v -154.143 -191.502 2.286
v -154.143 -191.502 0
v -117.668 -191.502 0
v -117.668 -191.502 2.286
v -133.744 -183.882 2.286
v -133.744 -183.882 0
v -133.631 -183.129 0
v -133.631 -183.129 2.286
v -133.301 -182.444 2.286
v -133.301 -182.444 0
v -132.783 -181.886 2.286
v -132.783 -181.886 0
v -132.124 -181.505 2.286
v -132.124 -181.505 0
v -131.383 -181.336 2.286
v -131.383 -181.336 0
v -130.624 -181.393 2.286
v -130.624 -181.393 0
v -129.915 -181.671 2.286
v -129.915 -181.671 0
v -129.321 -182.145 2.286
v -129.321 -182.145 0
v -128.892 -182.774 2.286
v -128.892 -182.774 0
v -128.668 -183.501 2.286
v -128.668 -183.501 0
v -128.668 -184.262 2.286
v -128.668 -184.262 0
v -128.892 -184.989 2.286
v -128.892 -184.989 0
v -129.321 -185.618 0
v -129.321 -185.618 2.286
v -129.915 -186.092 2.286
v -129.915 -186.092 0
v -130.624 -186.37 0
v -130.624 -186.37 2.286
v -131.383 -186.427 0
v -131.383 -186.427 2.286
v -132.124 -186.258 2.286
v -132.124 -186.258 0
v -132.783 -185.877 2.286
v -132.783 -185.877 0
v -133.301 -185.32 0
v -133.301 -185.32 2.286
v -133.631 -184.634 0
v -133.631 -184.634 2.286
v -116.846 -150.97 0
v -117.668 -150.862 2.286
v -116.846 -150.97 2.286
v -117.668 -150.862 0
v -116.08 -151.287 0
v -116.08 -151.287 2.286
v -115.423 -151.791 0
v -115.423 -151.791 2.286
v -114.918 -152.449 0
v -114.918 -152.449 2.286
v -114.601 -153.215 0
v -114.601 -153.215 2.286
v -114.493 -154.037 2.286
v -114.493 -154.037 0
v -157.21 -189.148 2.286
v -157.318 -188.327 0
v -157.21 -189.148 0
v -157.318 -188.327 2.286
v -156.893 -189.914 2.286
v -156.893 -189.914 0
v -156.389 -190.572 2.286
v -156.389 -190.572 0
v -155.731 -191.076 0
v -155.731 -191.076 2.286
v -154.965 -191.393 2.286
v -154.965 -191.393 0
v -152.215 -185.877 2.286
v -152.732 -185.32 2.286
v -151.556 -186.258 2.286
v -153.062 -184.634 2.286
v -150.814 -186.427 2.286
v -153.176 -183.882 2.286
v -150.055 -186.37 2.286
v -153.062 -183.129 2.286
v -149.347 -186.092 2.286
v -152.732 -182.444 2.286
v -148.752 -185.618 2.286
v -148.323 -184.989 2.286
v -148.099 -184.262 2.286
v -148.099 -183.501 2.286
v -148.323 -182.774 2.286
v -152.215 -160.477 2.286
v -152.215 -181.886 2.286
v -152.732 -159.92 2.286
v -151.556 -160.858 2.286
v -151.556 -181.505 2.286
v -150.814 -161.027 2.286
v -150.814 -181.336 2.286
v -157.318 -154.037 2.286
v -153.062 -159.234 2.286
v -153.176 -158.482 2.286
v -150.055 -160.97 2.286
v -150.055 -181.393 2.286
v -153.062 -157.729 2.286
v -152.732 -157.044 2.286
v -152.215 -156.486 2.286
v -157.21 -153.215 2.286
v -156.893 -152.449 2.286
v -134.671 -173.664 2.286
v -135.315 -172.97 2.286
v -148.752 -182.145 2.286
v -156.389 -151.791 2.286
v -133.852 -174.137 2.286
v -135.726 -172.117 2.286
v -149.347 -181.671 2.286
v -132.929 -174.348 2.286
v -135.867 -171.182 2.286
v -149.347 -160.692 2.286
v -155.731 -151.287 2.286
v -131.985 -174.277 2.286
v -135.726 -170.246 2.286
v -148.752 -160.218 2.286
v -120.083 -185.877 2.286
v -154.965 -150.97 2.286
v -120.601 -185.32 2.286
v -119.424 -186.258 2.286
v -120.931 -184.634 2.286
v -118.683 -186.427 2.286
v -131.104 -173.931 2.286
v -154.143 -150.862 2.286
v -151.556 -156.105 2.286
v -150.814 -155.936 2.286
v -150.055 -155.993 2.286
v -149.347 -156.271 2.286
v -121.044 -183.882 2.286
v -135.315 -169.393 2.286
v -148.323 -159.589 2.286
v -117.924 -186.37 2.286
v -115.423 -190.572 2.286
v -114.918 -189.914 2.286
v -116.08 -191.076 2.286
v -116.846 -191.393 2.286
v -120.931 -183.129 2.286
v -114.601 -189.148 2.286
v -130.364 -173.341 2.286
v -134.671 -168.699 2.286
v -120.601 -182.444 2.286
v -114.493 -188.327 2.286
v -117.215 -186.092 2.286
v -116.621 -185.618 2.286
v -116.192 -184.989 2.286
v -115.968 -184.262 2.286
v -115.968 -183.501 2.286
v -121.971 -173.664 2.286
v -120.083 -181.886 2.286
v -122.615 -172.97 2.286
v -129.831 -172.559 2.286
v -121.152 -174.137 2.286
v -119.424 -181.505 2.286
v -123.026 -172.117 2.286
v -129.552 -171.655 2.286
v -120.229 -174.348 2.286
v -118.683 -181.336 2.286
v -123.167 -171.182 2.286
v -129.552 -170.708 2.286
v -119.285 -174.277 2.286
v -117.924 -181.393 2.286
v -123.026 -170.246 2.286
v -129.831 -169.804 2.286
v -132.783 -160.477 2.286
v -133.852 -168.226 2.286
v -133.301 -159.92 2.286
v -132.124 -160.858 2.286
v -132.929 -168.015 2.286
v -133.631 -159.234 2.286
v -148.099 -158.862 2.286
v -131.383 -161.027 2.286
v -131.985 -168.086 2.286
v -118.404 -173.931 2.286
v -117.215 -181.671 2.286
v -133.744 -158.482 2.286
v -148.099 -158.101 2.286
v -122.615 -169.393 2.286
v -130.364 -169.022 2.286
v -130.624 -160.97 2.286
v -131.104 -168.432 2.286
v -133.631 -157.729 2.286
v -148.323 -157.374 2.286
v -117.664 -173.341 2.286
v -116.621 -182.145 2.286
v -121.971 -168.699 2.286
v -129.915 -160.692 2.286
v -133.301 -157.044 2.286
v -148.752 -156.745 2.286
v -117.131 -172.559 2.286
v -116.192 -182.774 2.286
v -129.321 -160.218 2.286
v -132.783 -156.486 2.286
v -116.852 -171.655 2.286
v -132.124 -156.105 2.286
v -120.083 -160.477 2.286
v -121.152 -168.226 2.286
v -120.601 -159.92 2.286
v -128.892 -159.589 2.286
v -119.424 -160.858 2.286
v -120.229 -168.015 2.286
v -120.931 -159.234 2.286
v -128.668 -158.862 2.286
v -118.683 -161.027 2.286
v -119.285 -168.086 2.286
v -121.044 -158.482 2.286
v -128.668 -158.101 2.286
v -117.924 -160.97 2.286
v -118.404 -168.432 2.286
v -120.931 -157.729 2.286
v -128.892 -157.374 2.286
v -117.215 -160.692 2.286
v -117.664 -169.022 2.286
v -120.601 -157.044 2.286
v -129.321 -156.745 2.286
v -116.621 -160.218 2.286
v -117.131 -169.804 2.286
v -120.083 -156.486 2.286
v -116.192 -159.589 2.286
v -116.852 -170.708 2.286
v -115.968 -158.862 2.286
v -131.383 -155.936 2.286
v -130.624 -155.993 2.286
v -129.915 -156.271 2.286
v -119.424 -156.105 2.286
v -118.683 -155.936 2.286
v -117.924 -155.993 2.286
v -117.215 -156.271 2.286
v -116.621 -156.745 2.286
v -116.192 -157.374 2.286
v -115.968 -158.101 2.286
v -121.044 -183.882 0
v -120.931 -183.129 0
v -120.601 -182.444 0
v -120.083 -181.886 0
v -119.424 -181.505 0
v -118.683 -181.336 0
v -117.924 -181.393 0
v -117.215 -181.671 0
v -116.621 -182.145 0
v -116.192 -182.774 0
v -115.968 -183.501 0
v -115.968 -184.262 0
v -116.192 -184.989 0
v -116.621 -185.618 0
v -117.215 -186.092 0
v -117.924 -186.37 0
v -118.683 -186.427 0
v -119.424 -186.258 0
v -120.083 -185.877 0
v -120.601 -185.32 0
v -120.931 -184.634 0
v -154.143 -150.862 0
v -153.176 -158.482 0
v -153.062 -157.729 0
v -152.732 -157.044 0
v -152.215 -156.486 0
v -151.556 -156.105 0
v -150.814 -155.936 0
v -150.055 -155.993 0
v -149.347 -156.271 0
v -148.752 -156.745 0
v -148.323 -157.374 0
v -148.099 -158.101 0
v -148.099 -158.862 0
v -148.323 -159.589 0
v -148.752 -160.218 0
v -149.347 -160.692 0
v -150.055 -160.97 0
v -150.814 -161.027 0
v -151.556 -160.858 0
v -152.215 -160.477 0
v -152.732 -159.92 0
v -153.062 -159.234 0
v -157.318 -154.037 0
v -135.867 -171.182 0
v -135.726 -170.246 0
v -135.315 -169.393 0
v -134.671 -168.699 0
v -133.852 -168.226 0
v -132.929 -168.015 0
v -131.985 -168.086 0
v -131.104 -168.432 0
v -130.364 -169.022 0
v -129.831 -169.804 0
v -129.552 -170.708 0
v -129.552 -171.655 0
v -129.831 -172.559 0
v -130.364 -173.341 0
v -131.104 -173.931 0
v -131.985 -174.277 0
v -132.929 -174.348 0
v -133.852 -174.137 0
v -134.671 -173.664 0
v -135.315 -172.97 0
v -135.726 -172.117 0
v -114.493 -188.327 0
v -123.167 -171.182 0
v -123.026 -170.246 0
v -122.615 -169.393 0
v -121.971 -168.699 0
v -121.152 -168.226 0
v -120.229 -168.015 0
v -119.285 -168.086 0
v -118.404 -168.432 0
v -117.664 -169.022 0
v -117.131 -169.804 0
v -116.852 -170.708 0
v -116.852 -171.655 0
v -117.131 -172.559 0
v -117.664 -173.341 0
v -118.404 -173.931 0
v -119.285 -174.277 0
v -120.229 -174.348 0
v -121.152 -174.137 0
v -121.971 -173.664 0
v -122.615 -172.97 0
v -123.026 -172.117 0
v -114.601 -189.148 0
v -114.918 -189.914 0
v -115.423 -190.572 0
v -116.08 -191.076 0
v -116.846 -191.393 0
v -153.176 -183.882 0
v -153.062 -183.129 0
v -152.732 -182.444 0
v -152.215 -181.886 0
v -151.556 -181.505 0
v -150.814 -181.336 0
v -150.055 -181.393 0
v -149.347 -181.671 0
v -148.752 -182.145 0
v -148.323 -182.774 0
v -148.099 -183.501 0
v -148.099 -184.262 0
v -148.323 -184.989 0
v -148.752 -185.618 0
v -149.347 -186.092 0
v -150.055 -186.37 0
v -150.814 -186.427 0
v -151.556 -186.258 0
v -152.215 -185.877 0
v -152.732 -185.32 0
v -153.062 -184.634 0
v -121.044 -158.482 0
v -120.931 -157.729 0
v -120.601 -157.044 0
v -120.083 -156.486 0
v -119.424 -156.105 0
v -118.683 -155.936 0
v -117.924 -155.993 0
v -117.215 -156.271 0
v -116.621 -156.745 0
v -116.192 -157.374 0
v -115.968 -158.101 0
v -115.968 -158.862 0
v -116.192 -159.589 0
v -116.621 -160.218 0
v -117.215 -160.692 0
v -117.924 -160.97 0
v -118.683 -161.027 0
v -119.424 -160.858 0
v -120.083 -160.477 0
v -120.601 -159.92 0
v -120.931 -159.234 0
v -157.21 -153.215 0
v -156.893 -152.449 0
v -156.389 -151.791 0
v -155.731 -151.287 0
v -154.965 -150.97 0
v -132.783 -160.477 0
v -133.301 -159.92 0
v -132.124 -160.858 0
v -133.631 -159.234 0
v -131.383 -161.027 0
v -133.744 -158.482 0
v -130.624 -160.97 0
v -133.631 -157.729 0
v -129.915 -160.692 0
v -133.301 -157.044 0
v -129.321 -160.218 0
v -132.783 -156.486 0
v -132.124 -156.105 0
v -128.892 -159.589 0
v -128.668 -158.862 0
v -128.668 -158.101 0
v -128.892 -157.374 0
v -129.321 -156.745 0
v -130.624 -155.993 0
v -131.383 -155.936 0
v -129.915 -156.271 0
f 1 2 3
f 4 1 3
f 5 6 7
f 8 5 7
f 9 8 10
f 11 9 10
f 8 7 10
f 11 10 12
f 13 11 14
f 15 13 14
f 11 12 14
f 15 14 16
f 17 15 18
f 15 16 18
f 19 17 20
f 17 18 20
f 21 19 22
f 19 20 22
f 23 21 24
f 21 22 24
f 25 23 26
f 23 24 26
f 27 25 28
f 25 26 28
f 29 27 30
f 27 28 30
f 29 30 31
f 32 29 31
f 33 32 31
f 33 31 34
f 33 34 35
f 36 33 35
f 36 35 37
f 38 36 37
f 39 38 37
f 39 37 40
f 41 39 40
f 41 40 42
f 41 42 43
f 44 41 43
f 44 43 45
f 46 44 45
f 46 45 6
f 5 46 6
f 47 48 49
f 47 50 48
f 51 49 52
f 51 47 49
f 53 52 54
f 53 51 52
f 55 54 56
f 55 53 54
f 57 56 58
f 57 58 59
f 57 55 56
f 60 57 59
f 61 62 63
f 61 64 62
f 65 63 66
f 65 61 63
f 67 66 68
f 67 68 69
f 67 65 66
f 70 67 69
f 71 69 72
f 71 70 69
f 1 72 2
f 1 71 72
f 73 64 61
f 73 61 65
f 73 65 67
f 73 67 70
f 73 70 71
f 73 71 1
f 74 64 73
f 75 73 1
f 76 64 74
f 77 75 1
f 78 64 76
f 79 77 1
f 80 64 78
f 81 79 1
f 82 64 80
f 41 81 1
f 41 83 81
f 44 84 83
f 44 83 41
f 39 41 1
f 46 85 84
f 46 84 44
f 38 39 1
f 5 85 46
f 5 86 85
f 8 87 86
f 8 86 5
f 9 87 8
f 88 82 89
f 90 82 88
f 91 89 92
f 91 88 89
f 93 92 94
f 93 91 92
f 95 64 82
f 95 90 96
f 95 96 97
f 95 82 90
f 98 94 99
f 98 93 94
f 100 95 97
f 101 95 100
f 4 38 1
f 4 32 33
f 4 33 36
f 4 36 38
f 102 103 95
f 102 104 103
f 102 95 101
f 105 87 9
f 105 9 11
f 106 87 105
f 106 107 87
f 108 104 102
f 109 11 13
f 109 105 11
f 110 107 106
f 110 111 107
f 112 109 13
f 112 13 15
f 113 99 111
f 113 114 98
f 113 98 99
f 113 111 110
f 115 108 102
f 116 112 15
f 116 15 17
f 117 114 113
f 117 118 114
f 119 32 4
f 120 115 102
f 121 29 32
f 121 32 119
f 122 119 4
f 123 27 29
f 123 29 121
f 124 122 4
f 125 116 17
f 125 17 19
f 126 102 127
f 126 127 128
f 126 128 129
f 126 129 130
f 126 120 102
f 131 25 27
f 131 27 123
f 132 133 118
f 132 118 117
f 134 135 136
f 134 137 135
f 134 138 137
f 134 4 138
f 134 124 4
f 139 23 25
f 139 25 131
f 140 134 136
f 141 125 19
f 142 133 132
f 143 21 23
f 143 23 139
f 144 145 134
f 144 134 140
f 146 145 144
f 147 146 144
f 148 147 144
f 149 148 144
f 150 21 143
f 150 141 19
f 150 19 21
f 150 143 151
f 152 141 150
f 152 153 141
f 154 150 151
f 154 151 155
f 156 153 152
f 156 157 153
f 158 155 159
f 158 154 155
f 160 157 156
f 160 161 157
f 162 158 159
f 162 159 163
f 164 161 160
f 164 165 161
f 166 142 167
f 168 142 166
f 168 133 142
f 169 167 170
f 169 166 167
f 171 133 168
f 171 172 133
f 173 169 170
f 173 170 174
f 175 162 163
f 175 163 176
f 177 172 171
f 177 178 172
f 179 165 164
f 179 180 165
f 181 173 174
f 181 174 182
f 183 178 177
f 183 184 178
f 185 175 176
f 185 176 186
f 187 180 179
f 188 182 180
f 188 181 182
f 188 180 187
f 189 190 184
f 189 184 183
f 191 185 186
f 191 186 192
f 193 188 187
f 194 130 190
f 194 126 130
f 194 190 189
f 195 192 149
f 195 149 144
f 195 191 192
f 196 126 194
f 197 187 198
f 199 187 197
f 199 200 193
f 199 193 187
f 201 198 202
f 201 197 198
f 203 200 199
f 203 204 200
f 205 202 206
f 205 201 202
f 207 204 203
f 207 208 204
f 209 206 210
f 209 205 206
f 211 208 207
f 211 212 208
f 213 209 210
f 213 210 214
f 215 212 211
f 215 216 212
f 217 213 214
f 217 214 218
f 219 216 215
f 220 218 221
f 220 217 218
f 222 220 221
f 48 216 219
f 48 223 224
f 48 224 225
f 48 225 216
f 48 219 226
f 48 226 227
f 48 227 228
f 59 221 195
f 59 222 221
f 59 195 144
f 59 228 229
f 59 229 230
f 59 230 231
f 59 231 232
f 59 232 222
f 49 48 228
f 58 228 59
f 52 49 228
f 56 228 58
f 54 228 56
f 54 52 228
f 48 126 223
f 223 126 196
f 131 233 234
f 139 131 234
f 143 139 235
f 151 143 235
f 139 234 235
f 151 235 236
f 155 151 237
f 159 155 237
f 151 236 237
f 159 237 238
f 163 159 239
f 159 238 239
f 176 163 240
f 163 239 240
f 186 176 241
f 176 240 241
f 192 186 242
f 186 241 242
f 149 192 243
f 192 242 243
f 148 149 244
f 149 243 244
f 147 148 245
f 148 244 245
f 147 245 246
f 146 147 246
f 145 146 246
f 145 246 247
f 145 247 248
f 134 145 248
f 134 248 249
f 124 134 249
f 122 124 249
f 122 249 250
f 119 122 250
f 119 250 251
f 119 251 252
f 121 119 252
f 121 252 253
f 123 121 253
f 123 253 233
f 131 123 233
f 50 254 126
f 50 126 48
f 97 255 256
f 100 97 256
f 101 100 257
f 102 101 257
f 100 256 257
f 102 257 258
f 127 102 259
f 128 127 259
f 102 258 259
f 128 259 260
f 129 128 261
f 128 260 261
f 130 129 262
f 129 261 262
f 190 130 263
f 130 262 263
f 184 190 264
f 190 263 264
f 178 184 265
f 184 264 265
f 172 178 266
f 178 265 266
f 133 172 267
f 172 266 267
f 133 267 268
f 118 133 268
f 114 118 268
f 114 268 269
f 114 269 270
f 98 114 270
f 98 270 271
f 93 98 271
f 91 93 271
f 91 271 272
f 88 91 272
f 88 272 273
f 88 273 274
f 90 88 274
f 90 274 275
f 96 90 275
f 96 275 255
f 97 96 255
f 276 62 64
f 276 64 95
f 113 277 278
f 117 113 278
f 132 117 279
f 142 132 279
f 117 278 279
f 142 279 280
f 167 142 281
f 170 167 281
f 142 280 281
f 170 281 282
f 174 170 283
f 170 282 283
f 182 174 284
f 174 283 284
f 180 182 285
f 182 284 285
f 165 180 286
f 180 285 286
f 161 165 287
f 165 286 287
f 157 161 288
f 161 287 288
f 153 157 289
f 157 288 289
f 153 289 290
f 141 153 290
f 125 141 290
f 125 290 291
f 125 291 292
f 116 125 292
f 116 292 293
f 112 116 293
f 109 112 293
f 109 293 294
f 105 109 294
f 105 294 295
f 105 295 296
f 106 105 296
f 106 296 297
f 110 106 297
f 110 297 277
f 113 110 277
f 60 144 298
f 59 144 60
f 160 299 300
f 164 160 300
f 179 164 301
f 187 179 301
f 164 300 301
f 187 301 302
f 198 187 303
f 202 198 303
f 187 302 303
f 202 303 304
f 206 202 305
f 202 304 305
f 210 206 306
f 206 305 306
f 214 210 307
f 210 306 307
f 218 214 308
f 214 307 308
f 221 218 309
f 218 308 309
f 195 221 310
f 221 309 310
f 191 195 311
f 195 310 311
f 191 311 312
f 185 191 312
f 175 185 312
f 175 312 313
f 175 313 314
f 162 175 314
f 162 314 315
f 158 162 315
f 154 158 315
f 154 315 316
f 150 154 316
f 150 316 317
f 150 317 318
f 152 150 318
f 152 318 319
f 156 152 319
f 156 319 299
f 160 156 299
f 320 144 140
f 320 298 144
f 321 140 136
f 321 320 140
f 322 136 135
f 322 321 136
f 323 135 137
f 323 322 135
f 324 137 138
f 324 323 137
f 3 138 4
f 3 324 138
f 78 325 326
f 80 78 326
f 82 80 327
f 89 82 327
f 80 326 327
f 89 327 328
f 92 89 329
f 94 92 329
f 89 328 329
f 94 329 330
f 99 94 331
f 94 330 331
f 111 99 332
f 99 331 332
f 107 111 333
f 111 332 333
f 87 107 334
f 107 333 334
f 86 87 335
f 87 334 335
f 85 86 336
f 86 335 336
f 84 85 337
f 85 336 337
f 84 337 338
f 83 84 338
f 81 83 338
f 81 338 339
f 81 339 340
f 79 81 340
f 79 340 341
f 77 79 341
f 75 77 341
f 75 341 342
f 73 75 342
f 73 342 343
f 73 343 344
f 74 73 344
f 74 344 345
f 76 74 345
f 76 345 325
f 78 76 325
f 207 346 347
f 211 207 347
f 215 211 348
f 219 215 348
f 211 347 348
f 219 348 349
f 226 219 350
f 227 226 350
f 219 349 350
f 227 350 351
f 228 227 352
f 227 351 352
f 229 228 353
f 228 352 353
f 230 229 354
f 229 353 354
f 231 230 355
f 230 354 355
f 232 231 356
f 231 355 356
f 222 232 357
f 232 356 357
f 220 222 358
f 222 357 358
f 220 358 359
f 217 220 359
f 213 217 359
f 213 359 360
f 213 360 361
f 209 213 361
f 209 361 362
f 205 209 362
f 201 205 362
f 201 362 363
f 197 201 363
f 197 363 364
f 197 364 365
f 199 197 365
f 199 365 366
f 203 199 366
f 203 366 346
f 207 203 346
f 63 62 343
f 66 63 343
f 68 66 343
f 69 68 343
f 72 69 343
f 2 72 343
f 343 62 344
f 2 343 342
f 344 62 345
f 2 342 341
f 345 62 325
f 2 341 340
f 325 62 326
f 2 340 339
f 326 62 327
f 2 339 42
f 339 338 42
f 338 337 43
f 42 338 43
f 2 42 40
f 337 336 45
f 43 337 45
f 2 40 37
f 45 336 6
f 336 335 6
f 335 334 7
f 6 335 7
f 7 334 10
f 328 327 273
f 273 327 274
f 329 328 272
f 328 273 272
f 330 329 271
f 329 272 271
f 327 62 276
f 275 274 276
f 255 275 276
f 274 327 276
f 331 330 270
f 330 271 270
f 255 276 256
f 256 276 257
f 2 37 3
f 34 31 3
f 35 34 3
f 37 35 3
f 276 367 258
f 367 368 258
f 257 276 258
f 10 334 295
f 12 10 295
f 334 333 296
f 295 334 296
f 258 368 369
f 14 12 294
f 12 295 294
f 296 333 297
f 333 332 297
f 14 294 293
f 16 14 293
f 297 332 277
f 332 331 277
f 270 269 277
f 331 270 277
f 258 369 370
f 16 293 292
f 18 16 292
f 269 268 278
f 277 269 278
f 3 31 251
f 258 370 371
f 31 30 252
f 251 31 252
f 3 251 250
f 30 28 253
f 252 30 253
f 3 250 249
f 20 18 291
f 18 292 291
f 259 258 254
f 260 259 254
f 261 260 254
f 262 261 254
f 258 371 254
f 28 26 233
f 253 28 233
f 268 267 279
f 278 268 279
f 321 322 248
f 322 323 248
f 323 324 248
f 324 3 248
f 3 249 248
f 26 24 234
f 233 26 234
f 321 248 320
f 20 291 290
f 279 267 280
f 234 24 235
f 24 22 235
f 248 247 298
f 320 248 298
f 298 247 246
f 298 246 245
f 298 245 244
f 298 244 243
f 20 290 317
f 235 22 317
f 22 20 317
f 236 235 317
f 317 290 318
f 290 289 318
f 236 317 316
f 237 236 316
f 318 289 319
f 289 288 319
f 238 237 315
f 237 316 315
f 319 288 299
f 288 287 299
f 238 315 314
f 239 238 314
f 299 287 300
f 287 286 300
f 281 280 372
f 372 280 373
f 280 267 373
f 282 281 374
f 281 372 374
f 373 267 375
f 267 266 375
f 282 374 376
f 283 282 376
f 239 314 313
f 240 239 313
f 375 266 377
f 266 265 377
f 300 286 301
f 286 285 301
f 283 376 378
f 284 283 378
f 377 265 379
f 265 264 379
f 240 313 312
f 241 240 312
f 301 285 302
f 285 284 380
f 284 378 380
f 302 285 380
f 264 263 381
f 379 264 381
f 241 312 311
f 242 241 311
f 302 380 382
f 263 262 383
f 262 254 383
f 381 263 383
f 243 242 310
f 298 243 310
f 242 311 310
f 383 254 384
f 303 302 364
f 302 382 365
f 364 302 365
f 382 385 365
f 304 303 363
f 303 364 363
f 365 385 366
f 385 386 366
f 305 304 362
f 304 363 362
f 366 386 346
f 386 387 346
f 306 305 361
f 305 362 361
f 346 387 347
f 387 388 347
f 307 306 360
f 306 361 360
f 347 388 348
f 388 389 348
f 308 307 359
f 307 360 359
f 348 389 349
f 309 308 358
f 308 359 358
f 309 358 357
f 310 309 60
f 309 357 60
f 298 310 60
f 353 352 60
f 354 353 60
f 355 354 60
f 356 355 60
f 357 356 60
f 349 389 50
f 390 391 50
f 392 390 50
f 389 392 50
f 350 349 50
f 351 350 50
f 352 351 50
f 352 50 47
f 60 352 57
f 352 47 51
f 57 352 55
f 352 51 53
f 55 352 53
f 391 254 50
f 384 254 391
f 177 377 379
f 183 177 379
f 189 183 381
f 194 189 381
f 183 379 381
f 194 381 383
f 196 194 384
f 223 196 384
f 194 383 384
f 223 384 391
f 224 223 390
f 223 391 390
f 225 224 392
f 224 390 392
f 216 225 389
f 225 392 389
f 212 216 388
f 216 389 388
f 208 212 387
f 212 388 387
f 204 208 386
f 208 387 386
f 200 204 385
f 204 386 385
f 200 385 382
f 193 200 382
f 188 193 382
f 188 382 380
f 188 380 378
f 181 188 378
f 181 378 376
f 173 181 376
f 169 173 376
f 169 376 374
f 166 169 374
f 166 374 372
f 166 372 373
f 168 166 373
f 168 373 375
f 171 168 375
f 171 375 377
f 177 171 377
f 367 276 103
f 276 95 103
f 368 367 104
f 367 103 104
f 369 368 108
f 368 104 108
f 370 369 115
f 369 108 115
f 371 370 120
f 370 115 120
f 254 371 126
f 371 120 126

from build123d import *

# Parameters (mm, degrees)
SKETCH1_W              = 76.2
SKETCH1_H              = 40.64
BASE_FLANGE1_DEPTH     = 2.286
CUT_EXTRUDE1_REACH     = 249.845
SKETCH6_R              = 2.5527
SKETCH6_R_2            = 3.175
FILLET1_R              = 3.175
SKETCH7_W              = 53.484881044
SKETCH7_H              = 41.537228889
REMOVE_3RD_STAGE_DEPTH = 2.54
FILLET2_R              = 3.175
SKETCH8_W              = 26.577580406
SKETCH8_H              = 64.780145769
REMOVE_2ND_STAGE_DEPTH = 248.845041068
FILLET3_R              = 3.175


# Sheet-metal steps are written as plain solids
with BuildPart() as part:
    # Sketch1 → Base-Flange1 (new body)
    with BuildSketch(Plane.XY):
        with Locations((-119.218460544, -171.181541922)):
            Rectangle(SKETCH1_W, SKETCH1_H)
    extrude(amount=BASE_FLANGE1_DEPTH)

    # Sketch6 → Cut-Extrude1 (cut, up to next)
    with BuildSketch(Plane(origin=(0, 0, 0), x_dir=(-1, 0, 0), z_dir=(0, 0, -1)), mode=Mode.PRIVATE) as cut_extrude1_sk1:
        with Locations((150.6232, -158.481541922)):
            Circle(SKETCH6_R)
    cut_extrude1_tool1 = extrude(cut_extrude1_sk1.sketch, amount=-CUT_EXTRUDE1_REACH, mode=Mode.PRIVATE) & part.part
    # Sketch6 → Cut-Extrude1 (cut, up to next)
    with BuildSketch(Plane(origin=(0, 0, 0), x_dir=(-1, 0, 0), z_dir=(0, 0, -1)), mode=Mode.PRIVATE) as cut_extrude1_sk2:
        with Locations((150.6232, -183.881541922)):
            Circle(SKETCH6_R)
    cut_extrude1_tool2 = extrude(cut_extrude1_sk2.sketch, amount=-CUT_EXTRUDE1_REACH, mode=Mode.PRIVATE) & part.part
    # Sketch6 → Cut-Extrude1 (cut, up to next)
    with BuildSketch(Plane(origin=(0, 0, 0), x_dir=(-1, 0, 0), z_dir=(0, 0, -1)), mode=Mode.PRIVATE) as cut_extrude1_sk3:
        with Locations((118.4918, -158.481541922)):
            Circle(SKETCH6_R)
    cut_extrude1_tool3 = extrude(cut_extrude1_sk3.sketch, amount=-CUT_EXTRUDE1_REACH, mode=Mode.PRIVATE) & part.part
    # Sketch6 → Cut-Extrude1 (cut, up to next)
    with BuildSketch(Plane(origin=(0, 0, 0), x_dir=(-1, 0, 0), z_dir=(0, 0, -1)), mode=Mode.PRIVATE) as cut_extrude1_sk4:
        with Locations((119.9918, -171.181541922)):
            Circle(SKETCH6_R_2)
    cut_extrude1_tool4 = extrude(cut_extrude1_sk4.sketch, amount=-CUT_EXTRUDE1_REACH, mode=Mode.PRIVATE) & part.part
    # Sketch6 → Cut-Extrude1 (cut, up to next)
    with BuildSketch(Plane(origin=(0, 0, 0), x_dir=(-1, 0, 0), z_dir=(0, 0, -1)), mode=Mode.PRIVATE) as cut_extrude1_sk5:
        with Locations((118.4918, -183.881541922)):
            Circle(SKETCH6_R)
    cut_extrude1_tool5 = extrude(cut_extrude1_sk5.sketch, amount=-CUT_EXTRUDE1_REACH, mode=Mode.PRIVATE) & part.part
    # Sketch6 → Cut-Extrude1 (cut, up to next)
    with BuildSketch(Plane(origin=(0, 0, 0), x_dir=(-1, 0, 0), z_dir=(0, 0, -1)), mode=Mode.PRIVATE) as cut_extrude1_sk6:
        with Locations((131.1918, -158.481541922)):
            Circle(SKETCH6_R)
    cut_extrude1_tool6 = extrude(cut_extrude1_sk6.sketch, amount=-CUT_EXTRUDE1_REACH, mode=Mode.PRIVATE) & part.part
    # Sketch6 → Cut-Extrude1 (cut, up to next)
    with BuildSketch(Plane(origin=(0, 0, 0), x_dir=(-1, 0, 0), z_dir=(0, 0, -1)), mode=Mode.PRIVATE) as cut_extrude1_sk7:
        with Locations((132.6918, -171.181541922)):
            Circle(SKETCH6_R_2)
    cut_extrude1_tool7 = extrude(cut_extrude1_sk7.sketch, amount=-CUT_EXTRUDE1_REACH, mode=Mode.PRIVATE) & part.part
    # Sketch6 → Cut-Extrude1 (cut, up to next)
    with BuildSketch(Plane(origin=(0, 0, 0), x_dir=(-1, 0, 0), z_dir=(0, 0, -1)), mode=Mode.PRIVATE) as cut_extrude1_sk8:
        with Locations((131.1918, -183.881541922)):
            Circle(SKETCH6_R)
    cut_extrude1_tool8 = extrude(cut_extrude1_sk8.sketch, amount=-CUT_EXTRUDE1_REACH, mode=Mode.PRIVATE) & part.part
    # Sketch6 → Cut-Extrude1 (cut, up to next)
    with BuildSketch(Plane(origin=(0, 0, 0), x_dir=(-1, 0, 0), z_dir=(0, 0, -1)), mode=Mode.PRIVATE) as cut_extrude1_sk9:
        with Locations((105.7918, -158.481541922)):
            Circle(SKETCH6_R)
    cut_extrude1_tool9 = extrude(cut_extrude1_sk9.sketch, amount=-CUT_EXTRUDE1_REACH, mode=Mode.PRIVATE) & part.part
    # Sketch6 → Cut-Extrude1 (cut, up to next)
    with BuildSketch(Plane(origin=(0, 0, 0), x_dir=(-1, 0, 0), z_dir=(0, 0, -1)), mode=Mode.PRIVATE) as cut_extrude1_sk10:
        with Locations((107.2918, -171.181541922)):
            Circle(SKETCH6_R_2)
    cut_extrude1_tool10 = extrude(cut_extrude1_sk10.sketch, amount=-CUT_EXTRUDE1_REACH, mode=Mode.PRIVATE) & part.part
    # Sketch6 → Cut-Extrude1 (cut, up to next)
    with BuildSketch(Plane(origin=(0, 0, 0), x_dir=(-1, 0, 0), z_dir=(0, 0, -1)), mode=Mode.PRIVATE) as cut_extrude1_sk11:
        with Locations((105.7918, -183.881541922)):
            Circle(SKETCH6_R)
    cut_extrude1_tool11 = extrude(cut_extrude1_sk11.sketch, amount=-CUT_EXTRUDE1_REACH, mode=Mode.PRIVATE) & part.part
    # Sketch6 → Cut-Extrude1 (cut, up to next)
    with BuildSketch(Plane(origin=(0, 0, 0), x_dir=(-1, 0, 0), z_dir=(0, 0, -1)), mode=Mode.PRIVATE) as cut_extrude1_sk12:
        with Locations((93.0918, -158.481541922)):
            Circle(SKETCH6_R)
    cut_extrude1_tool12 = extrude(cut_extrude1_sk12.sketch, amount=-CUT_EXTRUDE1_REACH, mode=Mode.PRIVATE) & part.part
    # Sketch6 → Cut-Extrude1 (cut, up to next)
    with BuildSketch(Plane(origin=(0, 0, 0), x_dir=(-1, 0, 0), z_dir=(0, 0, -1)), mode=Mode.PRIVATE) as cut_extrude1_sk13:
        with Locations((94.5918, -171.181541922)):
            Circle(SKETCH6_R_2)
    cut_extrude1_tool13 = extrude(cut_extrude1_sk13.sketch, amount=-CUT_EXTRUDE1_REACH, mode=Mode.PRIVATE) & part.part
    # Sketch6 → Cut-Extrude1 (cut, up to next)
    with BuildSketch(Plane(origin=(0, 0, 0), x_dir=(-1, 0, 0), z_dir=(0, 0, -1)), mode=Mode.PRIVATE) as cut_extrude1_sk14:
        with Locations((93.0918, -183.881541922)):
            Circle(SKETCH6_R)
    cut_extrude1_tool14 = extrude(cut_extrude1_sk14.sketch, amount=-CUT_EXTRUDE1_REACH, mode=Mode.PRIVATE) & part.part
    add(cut_extrude1_tool1.solids().sort_by_distance((-150.6232, -158.481542, 0))[0], mode=Mode.SUBTRACT)
    add(cut_extrude1_tool2.solids().sort_by_distance((-150.6232, -183.881542, 0))[0], mode=Mode.SUBTRACT)
    add(cut_extrude1_tool3.solids().sort_by_distance((-118.4918, -158.481542, 0))[0], mode=Mode.SUBTRACT)
    add(cut_extrude1_tool4.solids().sort_by_distance((-119.9918, -171.181542, 0))[0], mode=Mode.SUBTRACT)
    add(cut_extrude1_tool5.solids().sort_by_distance((-118.4918, -183.881542, 0))[0], mode=Mode.SUBTRACT)
    add(cut_extrude1_tool6.solids().sort_by_distance((-131.1918, -158.481542, 0))[0], mode=Mode.SUBTRACT)
    add(cut_extrude1_tool7.solids().sort_by_distance((-132.6918, -171.181542, 0))[0], mode=Mode.SUBTRACT)
    add(cut_extrude1_tool8.solids().sort_by_distance((-131.1918, -183.881542, 0))[0], mode=Mode.SUBTRACT)
    add(cut_extrude1_tool9.solids().sort_by_distance((-105.7918, -158.481542, 0))[0], mode=Mode.SUBTRACT)
    add(cut_extrude1_tool10.solids().sort_by_distance((-107.2918, -171.181542, 0))[0], mode=Mode.SUBTRACT)
    add(cut_extrude1_tool11.solids().sort_by_distance((-105.7918, -183.881542, 0))[0], mode=Mode.SUBTRACT)
    add(cut_extrude1_tool12.solids().sort_by_distance((-93.0918, -158.481542, 0))[0], mode=Mode.SUBTRACT)
    add(cut_extrude1_tool13.solids().sort_by_distance((-94.5918, -171.181542, 0))[0], mode=Mode.SUBTRACT)
    add(cut_extrude1_tool14.solids().sort_by_distance((-93.0918, -183.881542, 0))[0], mode=Mode.SUBTRACT)

    # Fillet1
    fillet1_edges = [part.edges().sort_by_distance(p)[0] for p in [
        (-157.318460544, -150.861541922, 1.143),
        (-81.118460544, -150.861541922, 1.143),
        (-81.118460544, -191.501541922, 1.143),
        (-157.318460544, -191.501541922, 1.143),
    ]]
    fillet(fillet1_edges, radius=FILLET1_R)

    # Sketch7 → Remove 3rd Stage (cut)
    with BuildSketch(Plane.XY.offset(2.286)):
        with Locations((-75.050259478, -170.732927477)):
            Rectangle(SKETCH7_W, SKETCH7_H)
    extrude(amount=-REMOVE_3RD_STAGE_DEPTH, mode=Mode.SUBTRACT)

    # Fillet2
    fillet2_edges = [part.edges().sort_by_distance(p)[0] for p in [
        (-101.7927, -150.861541922, 1.143),
        (-101.7927, -191.501541922, 1.143),
    ]]
    fillet(fillet2_edges, radius=FILLET2_R)

    # Sketch8 → Remove 2nd Stage (cut, through all)
    with BuildSketch(Plane.XY.offset(2.286)):
        with Locations((-101.203909797, -170.174492323)):
            Rectangle(SKETCH8_W, SKETCH8_H)
    extrude(amount=-REMOVE_2ND_STAGE_DEPTH, mode=Mode.SUBTRACT)

    # Fillet3
    fillet3_edges = [part.edges().sort_by_distance(p)[0] for p in [
        (-114.4927, -191.501541922, 1.143),
        (-114.4927, -150.861541922, 1.143),
    ]]
    fillet(fillet3_edges, radius=FILLET3_R)


solid = part.part
